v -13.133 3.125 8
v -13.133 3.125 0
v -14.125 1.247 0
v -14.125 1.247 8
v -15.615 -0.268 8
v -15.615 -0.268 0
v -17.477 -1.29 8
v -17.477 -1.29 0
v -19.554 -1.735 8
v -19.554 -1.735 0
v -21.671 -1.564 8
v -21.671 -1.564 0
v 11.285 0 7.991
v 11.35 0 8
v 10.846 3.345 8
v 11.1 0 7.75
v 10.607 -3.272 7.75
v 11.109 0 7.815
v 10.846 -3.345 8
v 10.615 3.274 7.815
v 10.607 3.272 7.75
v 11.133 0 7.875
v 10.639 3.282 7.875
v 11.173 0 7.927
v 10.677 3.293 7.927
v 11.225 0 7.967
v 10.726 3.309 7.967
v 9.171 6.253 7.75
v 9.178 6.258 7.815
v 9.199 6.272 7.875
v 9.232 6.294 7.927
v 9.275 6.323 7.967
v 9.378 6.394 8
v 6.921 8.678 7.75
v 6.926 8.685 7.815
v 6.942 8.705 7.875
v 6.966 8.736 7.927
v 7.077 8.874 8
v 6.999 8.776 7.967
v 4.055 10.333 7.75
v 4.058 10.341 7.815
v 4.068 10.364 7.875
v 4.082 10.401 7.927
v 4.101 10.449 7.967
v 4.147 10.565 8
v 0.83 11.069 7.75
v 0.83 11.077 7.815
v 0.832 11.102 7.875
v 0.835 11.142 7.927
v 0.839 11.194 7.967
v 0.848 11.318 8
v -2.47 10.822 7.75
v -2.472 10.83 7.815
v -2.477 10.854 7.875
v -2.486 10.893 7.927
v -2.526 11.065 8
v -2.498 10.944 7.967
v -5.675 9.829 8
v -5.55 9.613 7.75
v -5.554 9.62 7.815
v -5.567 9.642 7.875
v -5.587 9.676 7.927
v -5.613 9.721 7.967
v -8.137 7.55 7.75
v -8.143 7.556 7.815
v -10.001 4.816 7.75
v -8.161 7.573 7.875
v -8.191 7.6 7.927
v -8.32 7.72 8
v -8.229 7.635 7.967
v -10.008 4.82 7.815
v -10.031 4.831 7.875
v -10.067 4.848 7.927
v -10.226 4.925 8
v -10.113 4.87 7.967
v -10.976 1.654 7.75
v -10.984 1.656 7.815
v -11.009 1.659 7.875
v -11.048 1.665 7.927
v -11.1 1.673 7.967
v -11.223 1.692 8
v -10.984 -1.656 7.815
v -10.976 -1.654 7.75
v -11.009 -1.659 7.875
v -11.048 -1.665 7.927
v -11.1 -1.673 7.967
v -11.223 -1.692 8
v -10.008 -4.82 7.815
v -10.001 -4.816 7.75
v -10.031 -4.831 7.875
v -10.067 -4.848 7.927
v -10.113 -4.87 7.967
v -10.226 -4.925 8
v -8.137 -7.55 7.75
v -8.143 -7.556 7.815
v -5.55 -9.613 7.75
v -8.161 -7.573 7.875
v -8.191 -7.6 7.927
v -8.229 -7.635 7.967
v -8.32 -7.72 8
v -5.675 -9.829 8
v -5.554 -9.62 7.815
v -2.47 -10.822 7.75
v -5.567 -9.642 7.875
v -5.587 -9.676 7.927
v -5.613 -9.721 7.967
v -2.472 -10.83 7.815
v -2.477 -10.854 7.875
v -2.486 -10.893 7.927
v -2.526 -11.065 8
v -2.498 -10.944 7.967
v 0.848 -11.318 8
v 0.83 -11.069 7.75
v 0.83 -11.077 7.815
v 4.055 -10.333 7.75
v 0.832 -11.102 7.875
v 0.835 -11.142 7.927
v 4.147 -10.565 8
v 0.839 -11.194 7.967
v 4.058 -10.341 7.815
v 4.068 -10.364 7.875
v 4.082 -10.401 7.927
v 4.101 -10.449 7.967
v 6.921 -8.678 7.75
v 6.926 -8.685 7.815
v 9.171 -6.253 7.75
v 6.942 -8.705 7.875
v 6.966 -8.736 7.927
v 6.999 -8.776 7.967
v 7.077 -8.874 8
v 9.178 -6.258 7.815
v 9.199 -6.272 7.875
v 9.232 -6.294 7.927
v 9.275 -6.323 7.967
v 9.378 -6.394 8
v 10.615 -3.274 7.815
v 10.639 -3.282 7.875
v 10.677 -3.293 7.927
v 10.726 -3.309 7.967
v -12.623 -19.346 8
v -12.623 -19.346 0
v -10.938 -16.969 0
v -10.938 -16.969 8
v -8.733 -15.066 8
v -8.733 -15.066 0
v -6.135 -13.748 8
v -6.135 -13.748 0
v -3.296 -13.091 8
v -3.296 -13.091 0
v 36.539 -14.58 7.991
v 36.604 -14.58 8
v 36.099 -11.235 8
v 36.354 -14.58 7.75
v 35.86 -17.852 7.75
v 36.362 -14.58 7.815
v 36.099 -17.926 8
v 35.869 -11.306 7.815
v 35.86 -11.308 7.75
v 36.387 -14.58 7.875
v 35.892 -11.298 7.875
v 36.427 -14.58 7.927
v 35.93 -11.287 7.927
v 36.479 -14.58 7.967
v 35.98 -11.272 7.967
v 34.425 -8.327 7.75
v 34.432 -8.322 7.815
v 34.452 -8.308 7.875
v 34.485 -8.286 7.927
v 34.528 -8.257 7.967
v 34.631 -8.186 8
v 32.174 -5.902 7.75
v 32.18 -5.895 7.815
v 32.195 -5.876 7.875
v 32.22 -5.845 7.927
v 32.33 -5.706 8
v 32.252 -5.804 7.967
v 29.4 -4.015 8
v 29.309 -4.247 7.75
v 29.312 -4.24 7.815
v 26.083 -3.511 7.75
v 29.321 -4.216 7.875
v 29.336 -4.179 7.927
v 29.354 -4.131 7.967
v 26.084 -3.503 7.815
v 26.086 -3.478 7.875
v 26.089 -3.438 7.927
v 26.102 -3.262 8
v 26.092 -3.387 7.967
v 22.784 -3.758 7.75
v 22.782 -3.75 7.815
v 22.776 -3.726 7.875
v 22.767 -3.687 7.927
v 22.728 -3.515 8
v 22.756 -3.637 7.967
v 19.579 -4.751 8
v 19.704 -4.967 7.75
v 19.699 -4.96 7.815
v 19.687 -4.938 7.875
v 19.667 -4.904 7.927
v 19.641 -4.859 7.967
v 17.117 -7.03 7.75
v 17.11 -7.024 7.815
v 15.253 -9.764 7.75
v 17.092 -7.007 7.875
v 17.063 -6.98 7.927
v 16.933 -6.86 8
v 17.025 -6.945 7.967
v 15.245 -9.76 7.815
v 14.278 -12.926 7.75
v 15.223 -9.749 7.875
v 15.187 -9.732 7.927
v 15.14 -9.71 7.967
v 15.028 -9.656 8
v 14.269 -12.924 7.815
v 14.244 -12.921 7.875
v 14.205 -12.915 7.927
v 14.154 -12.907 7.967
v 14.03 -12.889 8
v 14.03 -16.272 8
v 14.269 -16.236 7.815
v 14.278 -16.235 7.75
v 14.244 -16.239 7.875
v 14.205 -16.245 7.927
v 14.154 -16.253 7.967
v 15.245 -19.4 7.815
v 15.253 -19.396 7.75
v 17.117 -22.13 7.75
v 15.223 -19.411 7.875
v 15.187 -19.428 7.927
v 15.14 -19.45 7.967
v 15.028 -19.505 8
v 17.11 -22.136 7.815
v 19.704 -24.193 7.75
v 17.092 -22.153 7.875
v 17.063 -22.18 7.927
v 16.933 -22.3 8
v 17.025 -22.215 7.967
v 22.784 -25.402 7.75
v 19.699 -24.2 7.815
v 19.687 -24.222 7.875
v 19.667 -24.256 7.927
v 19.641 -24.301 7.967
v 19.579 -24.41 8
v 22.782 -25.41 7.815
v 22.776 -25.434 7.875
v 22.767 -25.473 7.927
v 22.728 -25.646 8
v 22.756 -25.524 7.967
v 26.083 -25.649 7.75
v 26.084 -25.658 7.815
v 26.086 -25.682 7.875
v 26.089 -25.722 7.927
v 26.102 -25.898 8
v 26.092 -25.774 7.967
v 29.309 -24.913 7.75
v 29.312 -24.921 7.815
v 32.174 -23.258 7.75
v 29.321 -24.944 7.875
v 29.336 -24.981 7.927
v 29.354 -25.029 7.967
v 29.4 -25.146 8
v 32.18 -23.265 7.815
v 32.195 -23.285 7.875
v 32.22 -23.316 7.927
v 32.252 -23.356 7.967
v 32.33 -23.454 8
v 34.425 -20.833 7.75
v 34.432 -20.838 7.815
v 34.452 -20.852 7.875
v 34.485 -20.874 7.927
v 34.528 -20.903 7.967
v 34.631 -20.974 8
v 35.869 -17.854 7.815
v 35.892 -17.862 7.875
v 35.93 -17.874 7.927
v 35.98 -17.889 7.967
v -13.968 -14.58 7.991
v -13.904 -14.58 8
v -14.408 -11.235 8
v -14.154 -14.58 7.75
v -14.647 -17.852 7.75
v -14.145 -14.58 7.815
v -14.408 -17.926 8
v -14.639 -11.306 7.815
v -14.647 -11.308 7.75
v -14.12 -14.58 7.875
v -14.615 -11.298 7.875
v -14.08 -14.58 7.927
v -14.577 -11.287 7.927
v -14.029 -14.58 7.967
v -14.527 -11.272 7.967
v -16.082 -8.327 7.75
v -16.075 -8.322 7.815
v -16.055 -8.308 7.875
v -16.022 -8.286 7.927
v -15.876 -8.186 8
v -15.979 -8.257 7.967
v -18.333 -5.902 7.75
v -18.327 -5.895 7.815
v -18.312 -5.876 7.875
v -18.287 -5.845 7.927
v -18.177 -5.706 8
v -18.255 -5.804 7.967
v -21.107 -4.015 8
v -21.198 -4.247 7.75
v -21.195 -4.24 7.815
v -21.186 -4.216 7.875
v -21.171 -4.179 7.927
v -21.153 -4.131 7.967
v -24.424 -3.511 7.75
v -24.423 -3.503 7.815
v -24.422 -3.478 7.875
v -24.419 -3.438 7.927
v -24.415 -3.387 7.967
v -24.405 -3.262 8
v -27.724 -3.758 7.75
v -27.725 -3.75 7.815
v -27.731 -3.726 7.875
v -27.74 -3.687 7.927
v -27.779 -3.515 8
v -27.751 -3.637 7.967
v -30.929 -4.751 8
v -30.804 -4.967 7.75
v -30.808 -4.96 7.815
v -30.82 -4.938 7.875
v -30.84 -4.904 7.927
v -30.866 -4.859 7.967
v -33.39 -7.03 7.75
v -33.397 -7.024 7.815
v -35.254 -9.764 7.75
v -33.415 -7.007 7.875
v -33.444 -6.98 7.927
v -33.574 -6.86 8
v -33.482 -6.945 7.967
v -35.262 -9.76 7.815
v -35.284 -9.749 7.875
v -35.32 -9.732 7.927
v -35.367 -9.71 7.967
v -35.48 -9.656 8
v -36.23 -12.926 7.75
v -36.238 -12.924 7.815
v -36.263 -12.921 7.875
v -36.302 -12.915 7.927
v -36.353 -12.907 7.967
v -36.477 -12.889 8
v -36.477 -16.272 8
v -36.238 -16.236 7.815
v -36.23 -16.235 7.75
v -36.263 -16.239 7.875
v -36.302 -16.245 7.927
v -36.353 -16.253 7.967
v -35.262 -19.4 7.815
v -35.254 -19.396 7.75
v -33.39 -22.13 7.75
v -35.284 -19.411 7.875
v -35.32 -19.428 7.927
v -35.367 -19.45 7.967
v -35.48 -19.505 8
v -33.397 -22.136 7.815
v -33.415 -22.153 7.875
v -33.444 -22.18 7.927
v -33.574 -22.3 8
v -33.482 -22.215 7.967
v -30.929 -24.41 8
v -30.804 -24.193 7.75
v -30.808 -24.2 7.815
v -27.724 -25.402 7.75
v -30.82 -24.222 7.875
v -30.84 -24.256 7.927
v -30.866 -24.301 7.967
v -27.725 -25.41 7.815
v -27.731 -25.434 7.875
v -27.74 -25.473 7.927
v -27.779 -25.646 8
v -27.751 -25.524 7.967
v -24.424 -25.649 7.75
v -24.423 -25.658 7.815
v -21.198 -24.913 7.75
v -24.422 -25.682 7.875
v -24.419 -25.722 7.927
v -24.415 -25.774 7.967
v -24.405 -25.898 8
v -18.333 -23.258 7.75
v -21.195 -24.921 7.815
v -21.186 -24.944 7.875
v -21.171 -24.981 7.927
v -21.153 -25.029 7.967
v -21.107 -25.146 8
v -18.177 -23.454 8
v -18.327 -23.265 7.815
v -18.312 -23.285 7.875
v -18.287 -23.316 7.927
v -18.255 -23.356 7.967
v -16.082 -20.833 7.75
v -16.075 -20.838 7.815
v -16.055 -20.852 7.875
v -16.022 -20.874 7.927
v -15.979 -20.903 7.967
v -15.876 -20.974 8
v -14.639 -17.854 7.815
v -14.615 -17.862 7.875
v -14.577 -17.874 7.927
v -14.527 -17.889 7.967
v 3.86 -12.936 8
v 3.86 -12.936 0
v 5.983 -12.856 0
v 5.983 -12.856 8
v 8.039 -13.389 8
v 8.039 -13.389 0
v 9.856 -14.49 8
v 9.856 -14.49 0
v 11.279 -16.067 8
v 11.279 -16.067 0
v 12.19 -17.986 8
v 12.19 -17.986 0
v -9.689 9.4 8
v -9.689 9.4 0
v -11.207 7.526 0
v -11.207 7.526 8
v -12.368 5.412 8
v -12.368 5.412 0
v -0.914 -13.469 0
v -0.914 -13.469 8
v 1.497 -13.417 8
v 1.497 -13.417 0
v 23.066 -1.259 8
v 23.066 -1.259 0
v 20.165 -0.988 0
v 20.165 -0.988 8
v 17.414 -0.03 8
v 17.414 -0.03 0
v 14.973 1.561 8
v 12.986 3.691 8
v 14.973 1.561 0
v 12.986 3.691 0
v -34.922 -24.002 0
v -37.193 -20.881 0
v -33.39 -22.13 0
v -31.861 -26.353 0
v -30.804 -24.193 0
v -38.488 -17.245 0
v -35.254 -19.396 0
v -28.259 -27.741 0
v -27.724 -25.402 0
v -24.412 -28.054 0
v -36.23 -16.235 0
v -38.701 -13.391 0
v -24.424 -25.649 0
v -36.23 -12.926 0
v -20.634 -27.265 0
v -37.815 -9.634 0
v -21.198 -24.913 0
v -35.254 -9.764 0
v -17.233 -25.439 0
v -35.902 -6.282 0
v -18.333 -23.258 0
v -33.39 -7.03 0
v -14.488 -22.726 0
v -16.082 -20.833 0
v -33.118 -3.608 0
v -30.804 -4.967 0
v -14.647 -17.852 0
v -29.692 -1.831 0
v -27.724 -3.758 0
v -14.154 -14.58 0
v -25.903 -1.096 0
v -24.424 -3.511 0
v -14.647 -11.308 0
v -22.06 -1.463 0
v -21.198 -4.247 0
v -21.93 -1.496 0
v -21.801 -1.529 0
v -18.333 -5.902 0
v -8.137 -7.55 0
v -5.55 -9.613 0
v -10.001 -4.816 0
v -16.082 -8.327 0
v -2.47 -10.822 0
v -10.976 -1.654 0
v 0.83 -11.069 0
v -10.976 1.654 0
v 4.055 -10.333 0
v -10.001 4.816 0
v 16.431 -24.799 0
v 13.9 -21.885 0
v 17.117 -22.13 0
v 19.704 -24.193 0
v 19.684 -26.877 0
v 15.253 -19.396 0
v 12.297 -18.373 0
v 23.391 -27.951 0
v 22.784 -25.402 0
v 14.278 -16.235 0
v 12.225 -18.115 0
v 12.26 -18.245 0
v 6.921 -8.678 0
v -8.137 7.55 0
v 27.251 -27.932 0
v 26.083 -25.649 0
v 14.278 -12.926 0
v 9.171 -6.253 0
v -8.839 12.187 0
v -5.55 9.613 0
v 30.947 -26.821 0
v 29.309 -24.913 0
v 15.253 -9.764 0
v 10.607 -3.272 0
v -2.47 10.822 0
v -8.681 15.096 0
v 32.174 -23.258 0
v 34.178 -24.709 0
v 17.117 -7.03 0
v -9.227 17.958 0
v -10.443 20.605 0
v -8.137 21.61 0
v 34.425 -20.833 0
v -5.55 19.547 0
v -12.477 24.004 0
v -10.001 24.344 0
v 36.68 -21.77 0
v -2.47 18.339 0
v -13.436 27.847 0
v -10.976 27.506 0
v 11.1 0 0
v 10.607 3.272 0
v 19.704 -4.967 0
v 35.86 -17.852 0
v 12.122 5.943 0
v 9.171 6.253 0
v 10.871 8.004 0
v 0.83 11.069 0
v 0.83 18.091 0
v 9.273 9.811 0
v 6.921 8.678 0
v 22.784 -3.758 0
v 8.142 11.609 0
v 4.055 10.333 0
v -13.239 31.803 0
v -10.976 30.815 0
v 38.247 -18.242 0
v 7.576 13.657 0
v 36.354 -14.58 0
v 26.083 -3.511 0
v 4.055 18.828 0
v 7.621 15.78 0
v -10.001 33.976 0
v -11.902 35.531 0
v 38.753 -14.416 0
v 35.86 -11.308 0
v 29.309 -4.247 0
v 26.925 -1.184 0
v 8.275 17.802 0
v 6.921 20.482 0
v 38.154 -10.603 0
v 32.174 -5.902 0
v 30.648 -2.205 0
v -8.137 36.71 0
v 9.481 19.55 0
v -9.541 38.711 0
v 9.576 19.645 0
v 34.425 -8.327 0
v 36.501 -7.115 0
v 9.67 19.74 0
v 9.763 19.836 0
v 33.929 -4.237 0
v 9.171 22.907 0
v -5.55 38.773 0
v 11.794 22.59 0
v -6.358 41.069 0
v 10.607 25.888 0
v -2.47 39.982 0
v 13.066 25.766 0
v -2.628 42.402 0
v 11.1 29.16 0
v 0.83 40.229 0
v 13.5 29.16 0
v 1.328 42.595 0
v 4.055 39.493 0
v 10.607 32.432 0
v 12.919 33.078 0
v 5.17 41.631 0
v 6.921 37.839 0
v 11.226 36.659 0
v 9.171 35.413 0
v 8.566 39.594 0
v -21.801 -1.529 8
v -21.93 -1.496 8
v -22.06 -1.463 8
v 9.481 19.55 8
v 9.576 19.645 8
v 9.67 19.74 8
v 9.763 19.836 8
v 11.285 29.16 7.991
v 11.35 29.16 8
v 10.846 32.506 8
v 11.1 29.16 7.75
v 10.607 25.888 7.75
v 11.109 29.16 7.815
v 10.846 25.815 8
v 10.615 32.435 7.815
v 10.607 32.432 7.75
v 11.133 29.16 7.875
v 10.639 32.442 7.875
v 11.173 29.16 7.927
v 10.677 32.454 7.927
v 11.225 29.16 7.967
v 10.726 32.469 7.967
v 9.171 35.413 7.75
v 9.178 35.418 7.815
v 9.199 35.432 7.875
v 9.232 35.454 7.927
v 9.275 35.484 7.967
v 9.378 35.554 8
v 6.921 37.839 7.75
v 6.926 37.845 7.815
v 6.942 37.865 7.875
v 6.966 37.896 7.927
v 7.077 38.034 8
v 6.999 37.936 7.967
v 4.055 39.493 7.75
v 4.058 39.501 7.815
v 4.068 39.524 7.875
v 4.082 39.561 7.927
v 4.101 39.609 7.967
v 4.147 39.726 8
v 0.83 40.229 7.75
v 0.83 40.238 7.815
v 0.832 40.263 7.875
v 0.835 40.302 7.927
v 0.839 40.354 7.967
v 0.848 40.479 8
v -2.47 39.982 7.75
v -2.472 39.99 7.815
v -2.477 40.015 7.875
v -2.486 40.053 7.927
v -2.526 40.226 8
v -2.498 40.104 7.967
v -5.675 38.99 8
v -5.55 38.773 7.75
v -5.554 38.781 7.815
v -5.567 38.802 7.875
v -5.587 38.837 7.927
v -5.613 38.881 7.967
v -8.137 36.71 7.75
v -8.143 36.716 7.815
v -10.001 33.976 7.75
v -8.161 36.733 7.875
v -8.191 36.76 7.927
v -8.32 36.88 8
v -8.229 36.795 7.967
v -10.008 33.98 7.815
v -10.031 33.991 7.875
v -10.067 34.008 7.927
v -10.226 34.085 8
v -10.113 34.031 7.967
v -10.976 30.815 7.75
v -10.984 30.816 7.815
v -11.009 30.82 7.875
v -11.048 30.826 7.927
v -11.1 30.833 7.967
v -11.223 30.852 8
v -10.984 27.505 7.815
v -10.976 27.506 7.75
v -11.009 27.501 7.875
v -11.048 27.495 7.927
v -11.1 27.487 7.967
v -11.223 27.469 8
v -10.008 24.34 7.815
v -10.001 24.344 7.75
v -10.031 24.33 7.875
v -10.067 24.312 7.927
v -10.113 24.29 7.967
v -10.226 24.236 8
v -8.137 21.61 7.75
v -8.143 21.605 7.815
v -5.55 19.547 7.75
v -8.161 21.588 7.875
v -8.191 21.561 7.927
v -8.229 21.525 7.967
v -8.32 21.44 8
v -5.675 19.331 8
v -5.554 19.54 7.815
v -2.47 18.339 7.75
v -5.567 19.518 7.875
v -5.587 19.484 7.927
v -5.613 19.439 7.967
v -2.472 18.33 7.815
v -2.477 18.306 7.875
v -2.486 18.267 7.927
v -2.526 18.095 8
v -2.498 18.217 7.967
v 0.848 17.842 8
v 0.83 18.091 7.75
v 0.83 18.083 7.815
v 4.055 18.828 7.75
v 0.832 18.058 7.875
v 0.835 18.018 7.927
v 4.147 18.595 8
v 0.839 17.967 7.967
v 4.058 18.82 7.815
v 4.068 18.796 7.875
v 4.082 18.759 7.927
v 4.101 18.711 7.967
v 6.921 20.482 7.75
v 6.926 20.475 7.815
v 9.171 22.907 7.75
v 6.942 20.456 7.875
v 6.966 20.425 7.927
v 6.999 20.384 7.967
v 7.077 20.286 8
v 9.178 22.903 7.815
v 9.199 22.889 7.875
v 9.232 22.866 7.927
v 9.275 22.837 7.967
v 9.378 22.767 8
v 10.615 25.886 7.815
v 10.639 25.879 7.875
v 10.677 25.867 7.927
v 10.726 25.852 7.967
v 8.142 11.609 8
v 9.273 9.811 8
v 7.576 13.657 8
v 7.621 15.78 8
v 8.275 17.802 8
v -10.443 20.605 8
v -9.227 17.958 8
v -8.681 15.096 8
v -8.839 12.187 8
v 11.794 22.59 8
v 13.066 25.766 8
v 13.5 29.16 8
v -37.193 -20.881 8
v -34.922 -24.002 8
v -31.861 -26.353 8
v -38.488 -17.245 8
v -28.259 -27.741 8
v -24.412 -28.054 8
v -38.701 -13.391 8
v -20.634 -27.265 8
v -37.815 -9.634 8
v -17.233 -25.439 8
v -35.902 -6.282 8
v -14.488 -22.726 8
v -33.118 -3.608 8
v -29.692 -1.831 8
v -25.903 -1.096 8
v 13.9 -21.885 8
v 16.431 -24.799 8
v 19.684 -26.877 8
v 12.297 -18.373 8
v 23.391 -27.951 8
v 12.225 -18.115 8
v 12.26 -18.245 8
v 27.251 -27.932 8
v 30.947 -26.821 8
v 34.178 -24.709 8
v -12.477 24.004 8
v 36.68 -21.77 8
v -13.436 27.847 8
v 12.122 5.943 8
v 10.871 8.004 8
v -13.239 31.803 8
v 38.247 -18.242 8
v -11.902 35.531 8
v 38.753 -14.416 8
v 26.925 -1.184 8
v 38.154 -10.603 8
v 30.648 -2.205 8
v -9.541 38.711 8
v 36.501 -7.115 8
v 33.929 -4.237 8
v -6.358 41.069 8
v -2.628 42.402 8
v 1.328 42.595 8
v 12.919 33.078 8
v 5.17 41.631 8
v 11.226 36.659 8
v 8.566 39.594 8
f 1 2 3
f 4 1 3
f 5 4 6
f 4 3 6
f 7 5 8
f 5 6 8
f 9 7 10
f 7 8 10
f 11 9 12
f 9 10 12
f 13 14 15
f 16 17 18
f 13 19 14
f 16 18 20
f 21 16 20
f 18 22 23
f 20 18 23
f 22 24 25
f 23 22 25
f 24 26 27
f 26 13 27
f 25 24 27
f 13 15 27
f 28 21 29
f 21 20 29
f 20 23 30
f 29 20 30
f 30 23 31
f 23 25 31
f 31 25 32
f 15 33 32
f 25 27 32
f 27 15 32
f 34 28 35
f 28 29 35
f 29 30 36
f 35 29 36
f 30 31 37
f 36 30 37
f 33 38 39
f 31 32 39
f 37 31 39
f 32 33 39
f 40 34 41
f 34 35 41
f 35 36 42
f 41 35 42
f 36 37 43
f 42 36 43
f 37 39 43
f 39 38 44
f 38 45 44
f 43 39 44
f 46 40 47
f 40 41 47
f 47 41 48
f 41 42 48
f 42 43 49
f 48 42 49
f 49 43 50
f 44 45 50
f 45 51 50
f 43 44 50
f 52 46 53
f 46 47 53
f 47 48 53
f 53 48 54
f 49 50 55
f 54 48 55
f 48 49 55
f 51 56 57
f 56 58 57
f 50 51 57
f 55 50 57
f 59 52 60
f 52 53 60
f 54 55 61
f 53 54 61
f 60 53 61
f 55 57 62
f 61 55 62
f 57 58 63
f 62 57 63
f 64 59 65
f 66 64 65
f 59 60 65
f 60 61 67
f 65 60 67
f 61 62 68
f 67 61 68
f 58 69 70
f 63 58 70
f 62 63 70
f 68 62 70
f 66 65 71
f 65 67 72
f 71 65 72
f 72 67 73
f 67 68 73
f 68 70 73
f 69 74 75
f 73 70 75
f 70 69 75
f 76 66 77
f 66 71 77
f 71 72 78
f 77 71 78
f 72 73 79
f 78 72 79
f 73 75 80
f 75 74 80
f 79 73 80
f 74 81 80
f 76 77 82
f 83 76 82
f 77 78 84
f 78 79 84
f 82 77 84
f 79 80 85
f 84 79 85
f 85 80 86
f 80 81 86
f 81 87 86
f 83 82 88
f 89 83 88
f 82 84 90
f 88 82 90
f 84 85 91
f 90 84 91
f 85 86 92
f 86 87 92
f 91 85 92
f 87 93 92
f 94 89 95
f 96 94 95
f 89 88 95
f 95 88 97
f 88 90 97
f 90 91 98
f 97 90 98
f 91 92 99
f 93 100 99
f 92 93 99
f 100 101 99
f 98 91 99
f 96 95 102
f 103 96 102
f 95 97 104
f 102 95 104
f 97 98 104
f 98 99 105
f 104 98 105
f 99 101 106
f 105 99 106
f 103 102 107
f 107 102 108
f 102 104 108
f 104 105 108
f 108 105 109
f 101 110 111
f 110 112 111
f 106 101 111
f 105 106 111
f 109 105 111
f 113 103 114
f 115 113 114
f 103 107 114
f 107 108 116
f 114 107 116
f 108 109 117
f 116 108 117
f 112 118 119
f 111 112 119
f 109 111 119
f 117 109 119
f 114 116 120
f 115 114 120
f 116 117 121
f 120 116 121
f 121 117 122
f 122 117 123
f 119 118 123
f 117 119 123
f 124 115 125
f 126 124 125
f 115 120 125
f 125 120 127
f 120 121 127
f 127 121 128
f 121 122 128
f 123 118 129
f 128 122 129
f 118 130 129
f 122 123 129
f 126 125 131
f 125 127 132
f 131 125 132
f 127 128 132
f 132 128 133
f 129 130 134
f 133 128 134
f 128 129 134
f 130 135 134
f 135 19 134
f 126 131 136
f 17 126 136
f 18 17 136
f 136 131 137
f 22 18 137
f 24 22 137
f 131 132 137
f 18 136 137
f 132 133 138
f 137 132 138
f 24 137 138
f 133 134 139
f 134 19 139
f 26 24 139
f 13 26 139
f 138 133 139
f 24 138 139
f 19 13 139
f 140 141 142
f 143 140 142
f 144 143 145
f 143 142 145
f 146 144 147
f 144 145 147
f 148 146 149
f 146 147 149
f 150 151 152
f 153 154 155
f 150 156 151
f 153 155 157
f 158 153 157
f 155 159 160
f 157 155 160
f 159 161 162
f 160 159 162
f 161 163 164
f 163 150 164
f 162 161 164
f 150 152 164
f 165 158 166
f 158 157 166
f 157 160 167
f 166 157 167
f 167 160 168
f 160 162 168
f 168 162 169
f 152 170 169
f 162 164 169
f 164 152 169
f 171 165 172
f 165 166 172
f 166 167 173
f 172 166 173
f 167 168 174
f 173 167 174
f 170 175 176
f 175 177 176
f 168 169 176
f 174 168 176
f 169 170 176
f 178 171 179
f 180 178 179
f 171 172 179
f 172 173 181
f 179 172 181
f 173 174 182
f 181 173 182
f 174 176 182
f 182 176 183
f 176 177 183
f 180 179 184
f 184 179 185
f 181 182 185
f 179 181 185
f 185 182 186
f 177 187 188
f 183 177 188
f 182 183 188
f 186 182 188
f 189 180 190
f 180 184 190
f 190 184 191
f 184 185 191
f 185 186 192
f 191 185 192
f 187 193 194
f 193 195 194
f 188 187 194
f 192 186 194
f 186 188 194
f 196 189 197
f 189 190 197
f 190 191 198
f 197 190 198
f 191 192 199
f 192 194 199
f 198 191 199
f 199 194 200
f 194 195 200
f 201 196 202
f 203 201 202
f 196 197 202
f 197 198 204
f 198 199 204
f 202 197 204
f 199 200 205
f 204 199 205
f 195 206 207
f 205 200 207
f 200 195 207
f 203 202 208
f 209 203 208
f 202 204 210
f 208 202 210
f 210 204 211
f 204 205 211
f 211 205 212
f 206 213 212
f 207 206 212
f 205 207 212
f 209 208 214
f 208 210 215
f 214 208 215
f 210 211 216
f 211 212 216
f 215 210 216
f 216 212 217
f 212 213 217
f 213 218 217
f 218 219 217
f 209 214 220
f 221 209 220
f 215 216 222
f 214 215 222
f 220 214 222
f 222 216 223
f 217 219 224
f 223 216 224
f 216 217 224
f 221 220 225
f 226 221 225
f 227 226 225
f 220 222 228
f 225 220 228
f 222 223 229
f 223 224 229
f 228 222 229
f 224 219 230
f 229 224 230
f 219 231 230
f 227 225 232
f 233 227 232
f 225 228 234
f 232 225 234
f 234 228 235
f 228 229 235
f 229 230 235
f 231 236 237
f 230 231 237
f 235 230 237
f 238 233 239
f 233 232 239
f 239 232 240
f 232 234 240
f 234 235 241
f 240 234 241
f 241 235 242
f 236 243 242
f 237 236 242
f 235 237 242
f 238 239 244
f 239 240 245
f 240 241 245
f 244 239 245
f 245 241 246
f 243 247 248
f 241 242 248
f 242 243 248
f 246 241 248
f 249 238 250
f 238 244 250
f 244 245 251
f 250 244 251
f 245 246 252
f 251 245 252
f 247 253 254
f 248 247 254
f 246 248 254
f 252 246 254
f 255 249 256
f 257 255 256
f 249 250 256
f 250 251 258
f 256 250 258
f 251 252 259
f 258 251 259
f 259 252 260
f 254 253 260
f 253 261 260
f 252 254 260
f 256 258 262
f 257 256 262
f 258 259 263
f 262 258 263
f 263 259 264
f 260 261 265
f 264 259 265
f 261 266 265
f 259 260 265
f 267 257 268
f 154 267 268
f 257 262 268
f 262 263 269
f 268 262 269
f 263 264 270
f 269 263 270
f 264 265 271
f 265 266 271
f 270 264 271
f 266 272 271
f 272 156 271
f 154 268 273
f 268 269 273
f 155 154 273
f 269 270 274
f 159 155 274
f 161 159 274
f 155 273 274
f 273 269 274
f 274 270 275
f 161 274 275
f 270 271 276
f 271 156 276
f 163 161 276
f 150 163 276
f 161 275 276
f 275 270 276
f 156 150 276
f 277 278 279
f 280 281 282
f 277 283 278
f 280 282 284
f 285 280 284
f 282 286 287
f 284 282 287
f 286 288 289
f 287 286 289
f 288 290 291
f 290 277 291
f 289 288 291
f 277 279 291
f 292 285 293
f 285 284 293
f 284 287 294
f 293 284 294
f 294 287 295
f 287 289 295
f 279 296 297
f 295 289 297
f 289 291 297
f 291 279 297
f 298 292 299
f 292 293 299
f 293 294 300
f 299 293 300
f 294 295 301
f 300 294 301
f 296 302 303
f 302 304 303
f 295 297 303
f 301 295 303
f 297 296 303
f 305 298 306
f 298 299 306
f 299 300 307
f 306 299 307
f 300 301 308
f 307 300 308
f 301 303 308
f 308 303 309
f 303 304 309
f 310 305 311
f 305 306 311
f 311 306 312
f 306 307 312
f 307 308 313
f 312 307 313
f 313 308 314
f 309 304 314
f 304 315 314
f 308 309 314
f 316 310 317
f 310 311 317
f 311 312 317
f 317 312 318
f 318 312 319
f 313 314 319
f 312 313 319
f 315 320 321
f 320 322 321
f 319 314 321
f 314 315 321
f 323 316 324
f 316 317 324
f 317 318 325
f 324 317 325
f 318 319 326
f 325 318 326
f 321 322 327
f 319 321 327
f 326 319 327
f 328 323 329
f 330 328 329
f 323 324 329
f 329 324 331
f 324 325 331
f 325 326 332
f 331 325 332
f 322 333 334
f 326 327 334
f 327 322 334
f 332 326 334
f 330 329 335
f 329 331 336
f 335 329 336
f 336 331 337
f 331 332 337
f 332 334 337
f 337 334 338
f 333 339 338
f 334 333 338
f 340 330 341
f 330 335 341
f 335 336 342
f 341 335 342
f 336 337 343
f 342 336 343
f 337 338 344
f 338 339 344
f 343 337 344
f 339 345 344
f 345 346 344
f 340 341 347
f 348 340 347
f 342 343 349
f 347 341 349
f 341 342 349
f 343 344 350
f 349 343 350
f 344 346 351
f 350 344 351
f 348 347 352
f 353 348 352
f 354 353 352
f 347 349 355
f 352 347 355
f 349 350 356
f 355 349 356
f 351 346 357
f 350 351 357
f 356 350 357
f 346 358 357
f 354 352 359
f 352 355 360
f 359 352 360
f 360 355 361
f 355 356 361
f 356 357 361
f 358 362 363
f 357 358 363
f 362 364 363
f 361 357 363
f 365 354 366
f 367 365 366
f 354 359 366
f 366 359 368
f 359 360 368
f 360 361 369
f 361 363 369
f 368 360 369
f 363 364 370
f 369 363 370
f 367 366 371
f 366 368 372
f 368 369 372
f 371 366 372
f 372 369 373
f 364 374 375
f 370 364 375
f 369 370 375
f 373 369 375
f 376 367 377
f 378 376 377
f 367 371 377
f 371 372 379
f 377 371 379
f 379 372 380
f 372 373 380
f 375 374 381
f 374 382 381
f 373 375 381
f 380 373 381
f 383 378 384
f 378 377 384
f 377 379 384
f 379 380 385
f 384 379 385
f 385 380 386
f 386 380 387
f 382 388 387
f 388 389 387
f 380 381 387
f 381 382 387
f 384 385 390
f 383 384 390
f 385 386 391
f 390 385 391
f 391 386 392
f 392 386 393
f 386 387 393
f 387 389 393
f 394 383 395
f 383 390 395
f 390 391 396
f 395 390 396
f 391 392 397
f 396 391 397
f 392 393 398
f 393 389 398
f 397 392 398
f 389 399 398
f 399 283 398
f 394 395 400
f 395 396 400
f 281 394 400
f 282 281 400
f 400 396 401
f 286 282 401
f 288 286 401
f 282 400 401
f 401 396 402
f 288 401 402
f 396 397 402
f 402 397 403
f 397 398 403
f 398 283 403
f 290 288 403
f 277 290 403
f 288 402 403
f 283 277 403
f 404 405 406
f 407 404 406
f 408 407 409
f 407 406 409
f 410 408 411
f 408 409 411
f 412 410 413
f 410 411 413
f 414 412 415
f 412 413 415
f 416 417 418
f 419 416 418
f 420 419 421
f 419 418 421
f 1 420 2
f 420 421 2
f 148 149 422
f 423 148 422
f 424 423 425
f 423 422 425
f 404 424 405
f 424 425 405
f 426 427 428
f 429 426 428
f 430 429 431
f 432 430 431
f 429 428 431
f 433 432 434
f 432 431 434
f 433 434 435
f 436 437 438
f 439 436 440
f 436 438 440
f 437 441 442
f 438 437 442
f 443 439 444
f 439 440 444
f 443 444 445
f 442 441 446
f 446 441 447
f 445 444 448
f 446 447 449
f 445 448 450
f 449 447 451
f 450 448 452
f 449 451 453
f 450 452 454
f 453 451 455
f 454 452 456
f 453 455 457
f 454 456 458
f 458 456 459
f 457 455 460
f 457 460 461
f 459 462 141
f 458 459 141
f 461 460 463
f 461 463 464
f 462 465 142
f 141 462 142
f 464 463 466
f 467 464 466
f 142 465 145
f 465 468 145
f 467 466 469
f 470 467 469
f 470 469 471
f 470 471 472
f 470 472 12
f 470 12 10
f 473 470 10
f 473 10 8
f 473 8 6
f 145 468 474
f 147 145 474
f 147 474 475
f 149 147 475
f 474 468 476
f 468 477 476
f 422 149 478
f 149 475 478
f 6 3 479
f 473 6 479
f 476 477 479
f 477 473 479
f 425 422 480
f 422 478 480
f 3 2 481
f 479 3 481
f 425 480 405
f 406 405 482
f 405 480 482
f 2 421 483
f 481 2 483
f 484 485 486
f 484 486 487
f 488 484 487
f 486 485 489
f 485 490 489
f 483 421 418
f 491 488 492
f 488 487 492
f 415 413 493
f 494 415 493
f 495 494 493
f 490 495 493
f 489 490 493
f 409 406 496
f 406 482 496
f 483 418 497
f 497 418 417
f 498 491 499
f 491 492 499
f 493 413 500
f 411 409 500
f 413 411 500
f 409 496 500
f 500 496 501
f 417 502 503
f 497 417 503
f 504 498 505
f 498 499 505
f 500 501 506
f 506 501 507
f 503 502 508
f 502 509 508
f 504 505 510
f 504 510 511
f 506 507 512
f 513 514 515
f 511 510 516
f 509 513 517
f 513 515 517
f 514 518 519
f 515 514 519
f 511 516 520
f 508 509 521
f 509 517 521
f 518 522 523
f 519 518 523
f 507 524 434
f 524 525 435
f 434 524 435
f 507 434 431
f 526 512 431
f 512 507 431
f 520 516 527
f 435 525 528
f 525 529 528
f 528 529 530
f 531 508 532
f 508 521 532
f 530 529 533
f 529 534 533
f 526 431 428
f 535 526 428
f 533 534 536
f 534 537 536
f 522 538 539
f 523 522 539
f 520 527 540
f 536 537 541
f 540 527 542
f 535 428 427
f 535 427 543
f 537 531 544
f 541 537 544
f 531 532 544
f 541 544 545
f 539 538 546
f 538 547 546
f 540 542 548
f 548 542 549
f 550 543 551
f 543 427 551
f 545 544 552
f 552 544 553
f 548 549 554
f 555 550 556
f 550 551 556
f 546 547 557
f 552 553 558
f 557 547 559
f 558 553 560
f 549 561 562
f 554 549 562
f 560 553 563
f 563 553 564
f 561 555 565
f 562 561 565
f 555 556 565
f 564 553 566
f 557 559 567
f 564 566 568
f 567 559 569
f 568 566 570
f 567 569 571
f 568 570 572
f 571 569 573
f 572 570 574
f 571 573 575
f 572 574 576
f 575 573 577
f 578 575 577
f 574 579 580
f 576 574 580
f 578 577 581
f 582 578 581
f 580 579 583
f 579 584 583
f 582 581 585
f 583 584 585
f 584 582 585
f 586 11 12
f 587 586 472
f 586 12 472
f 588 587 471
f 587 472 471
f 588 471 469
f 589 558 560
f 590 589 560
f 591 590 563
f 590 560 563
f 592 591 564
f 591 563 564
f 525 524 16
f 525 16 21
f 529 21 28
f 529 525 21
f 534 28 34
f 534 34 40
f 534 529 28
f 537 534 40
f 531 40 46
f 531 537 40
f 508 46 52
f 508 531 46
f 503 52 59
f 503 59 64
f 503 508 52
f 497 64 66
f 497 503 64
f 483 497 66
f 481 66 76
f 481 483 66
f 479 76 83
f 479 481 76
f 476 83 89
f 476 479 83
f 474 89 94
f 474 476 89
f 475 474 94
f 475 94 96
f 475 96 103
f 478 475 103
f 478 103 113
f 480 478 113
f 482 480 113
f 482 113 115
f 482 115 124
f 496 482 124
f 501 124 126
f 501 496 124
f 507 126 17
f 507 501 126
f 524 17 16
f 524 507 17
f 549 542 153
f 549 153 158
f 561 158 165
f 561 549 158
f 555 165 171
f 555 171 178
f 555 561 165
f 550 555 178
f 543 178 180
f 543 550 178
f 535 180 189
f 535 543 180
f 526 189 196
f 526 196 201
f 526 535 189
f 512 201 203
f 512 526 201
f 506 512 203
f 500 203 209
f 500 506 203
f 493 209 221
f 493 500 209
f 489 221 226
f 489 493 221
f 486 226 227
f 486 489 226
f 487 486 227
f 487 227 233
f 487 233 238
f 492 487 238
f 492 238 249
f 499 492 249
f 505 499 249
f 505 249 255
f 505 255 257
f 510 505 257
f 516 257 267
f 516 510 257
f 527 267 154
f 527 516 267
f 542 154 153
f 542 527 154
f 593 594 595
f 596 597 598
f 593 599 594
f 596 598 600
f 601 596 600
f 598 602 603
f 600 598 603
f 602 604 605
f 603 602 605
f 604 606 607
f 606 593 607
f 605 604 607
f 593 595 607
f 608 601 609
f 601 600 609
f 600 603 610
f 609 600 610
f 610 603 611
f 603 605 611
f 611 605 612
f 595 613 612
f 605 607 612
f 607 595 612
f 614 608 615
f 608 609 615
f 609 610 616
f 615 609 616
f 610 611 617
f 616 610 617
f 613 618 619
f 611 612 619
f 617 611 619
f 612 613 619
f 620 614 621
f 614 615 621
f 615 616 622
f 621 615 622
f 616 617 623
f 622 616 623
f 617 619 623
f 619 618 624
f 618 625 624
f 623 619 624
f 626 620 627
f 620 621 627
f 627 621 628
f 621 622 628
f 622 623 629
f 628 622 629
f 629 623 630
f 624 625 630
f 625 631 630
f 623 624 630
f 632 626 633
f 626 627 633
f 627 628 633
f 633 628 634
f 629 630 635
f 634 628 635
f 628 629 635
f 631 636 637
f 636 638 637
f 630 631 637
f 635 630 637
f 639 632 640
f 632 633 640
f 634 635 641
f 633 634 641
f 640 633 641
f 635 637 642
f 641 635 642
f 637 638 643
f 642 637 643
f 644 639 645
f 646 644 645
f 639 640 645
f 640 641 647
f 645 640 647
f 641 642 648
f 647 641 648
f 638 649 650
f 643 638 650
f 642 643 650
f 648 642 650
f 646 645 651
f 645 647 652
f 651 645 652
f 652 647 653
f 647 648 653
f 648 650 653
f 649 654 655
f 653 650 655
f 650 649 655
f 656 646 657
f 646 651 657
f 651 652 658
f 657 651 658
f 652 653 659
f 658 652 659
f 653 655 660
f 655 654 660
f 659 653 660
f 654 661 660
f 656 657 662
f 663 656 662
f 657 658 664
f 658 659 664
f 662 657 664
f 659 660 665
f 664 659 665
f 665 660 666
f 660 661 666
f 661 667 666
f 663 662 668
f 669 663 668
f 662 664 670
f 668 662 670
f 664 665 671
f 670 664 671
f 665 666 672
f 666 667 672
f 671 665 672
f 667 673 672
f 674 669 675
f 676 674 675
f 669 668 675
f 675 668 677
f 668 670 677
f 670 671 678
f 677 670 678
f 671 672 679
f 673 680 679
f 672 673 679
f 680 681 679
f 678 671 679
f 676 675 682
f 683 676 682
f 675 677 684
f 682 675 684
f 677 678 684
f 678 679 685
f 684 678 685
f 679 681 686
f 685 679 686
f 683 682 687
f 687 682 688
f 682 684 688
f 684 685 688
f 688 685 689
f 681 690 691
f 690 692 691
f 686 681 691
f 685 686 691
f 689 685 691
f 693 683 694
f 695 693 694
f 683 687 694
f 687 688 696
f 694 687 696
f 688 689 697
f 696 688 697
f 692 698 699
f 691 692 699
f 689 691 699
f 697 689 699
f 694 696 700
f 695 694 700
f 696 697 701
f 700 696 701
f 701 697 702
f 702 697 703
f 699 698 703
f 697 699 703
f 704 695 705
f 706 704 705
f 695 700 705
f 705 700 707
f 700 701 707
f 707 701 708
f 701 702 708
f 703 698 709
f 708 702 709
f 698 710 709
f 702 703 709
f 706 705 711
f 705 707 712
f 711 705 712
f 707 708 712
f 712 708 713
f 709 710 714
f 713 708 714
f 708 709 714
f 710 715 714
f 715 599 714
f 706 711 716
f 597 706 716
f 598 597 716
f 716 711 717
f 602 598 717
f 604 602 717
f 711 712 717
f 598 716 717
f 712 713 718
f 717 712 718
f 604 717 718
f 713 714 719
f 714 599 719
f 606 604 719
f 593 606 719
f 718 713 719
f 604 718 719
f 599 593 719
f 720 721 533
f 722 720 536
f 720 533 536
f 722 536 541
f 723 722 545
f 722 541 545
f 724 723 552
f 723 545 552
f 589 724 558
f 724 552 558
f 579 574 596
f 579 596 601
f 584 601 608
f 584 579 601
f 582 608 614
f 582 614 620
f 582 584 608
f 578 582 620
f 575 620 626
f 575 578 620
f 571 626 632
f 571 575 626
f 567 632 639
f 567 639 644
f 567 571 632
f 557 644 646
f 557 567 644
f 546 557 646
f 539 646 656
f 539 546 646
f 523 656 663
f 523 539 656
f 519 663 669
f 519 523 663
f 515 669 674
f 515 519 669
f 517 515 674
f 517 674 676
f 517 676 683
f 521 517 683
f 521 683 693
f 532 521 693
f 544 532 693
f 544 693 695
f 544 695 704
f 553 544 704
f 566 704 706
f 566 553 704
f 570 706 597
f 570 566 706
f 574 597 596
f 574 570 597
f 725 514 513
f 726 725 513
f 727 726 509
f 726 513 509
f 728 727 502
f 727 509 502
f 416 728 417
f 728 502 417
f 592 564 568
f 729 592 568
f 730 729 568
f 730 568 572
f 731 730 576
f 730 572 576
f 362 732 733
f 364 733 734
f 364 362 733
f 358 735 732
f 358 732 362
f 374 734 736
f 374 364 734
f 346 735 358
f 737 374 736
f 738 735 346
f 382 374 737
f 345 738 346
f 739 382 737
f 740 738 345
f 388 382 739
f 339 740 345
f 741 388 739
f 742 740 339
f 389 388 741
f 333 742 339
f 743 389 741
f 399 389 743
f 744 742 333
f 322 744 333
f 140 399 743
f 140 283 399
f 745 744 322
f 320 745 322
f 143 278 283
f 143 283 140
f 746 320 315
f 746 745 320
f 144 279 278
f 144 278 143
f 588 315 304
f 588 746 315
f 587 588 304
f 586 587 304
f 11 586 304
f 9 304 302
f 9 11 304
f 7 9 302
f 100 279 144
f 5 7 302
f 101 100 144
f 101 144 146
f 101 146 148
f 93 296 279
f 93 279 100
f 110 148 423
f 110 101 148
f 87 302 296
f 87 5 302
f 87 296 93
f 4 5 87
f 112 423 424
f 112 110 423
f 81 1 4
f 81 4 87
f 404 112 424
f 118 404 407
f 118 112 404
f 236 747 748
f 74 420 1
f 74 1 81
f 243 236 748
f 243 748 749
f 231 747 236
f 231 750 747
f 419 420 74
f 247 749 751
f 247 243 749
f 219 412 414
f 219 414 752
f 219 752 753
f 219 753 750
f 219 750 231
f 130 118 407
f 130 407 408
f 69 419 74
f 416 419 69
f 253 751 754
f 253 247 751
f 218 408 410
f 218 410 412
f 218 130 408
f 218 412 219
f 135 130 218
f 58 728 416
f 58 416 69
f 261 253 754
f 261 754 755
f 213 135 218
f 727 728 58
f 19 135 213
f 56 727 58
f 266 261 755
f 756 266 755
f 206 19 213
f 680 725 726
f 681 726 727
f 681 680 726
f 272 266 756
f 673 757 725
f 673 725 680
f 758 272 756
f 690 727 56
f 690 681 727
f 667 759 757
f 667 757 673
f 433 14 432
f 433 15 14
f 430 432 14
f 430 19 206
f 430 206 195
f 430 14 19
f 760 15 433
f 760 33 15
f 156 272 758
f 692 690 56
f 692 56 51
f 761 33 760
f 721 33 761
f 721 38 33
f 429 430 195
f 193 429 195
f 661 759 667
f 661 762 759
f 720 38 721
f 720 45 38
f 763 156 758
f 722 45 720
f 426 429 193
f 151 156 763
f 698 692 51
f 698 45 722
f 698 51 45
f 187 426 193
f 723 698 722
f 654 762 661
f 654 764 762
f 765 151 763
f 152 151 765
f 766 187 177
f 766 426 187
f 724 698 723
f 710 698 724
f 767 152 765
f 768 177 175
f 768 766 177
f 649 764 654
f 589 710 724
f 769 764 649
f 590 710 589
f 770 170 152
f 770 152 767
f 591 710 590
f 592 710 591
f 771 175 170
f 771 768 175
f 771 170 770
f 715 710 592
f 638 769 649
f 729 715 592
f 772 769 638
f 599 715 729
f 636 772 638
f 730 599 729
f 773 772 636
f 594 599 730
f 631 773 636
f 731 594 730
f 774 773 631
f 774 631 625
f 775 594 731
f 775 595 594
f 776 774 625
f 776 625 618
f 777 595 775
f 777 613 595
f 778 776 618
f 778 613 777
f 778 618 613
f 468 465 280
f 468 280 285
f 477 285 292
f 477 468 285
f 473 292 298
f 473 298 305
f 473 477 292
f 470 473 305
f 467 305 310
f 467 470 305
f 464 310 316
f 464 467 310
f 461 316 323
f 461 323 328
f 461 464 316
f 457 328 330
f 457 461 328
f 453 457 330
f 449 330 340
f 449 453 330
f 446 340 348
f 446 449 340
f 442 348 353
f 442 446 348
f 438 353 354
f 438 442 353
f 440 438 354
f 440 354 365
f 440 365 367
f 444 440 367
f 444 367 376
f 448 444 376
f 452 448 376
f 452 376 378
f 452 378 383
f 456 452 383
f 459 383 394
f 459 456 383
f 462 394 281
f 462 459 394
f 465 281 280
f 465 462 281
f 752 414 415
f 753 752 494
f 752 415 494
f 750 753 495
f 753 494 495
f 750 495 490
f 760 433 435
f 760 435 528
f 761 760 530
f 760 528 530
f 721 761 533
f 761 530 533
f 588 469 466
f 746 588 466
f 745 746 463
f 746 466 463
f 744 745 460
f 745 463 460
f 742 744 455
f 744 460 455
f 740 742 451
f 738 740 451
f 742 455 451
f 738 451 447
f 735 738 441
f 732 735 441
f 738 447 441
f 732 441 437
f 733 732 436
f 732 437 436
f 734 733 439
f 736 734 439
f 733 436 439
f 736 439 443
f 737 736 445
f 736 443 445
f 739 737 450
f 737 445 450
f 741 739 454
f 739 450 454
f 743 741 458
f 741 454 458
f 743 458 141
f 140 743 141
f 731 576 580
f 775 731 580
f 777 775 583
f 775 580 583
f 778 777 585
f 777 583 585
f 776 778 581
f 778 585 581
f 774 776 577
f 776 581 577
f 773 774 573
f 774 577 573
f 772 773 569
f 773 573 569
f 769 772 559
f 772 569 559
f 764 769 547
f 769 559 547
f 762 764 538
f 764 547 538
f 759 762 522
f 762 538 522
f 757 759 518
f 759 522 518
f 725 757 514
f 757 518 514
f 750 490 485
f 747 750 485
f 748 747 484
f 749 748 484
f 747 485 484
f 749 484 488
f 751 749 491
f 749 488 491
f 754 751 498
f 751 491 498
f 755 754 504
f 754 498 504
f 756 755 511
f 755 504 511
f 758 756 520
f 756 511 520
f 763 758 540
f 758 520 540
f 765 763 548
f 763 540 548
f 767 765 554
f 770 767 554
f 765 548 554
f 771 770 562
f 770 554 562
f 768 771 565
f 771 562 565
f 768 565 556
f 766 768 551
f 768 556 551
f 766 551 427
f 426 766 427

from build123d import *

# Parameters (mm, degrees)
F0_R     = 11.1
F1_DEPTH = 8
F2_R     = 0.25


# Not quite as in the source:
# - a feature of the source that left no trace in its solid (it failed there, or was rolled back) is left out


with BuildPart() as f1:
    # F0 (on Top) → F1 (new body)
    with BuildSketch(Plane.XY):
        with BuildLine():
            ThreePointArc((3.859865491, -12.9364383967), (10.8249291944, -8.0666540731), (13.5, 0))
            ThreePointArc((13.5, 0), (13.3707834369, 1.8633706782), (12.9856073653, 3.691070489))
            ThreePointArc((12.9856073653, 3.691070489), (11.5424684167, 7.0015300363), (9.2733515405, 9.8109607688))
            ThreePointArc((9.2733515405, 9.8109607688), (-0.2922686684, 13.4968358894), (-9.6893644933, 9.4003306174))
            ThreePointArc((-9.6893644933, 9.4003306174), (-11.8347370851, 6.4953058532), (-13.1332170315, 3.1254776279))
            ThreePointArc((-13.1332170315, 3.1254776279), (-11.5424684167, -7.0015300363), (-3.296242872, -13.0914011064))
            ThreePointArc((-3.296242872, -13.0914011064), (0.2922686684, -13.4968358894), (3.859865491, -12.9364383967))
        make_face()
        Circle(F0_R, mode=Mode.SUBTRACT)
        with BuildLine():
            ThreePointArc((12.9856073653, 3.691070489), (13.3707834369, 1.8633706782), (13.5, 0))
            ThreePointArc((13.5, 0), (10.8249291944, -8.0666540731), (3.859865491, -12.9364383967))
            ThreePointArc((3.859865491, -12.9364383967), (8.9875948966, -13.8732661585), (12.1902212779, -17.985982946))
            ThreePointArc((12.1902212779, -17.985982946), (13.9354582524, -7.2213929241), (23.0659975588, -1.2585494405))
            ThreePointArc((23.0659975588, -1.2585494405), (17.4140534965, -0.0296267076), (12.9856073653, 3.691070489))
        make_face()
        with BuildLine():
            ThreePointArc((-9.6893644933, 9.4003306174), (-0.2922686684, 13.4968358894), (9.2733515405, 9.8109607688))
            ThreePointArc((9.2733515405, 9.8109607688), (7.5208034785, 14.7201185786), (9.4812075043, 19.5500327774))
            ThreePointArc((9.4812075043, 19.5500327774), (-0.7138194032, 15.679157322), (-10.443062992, 20.6050145698))
            ThreePointArc((-10.443062992, 20.6050145698), (-8.6813692668, 15.0958260647), (-9.6893644933, 9.4003306174))
        make_face()
        with BuildLine():
            ThreePointArc((38.7535366191, -14.580136165), (33.9919066812, -4.2898063036), (23.0659975588, -1.2585494405))
            ThreePointArc((23.0659975588, -1.2585494405), (13.9354582524, -7.2213929241), (12.1902212779, -17.985982946))
            ThreePointArc((12.1902212779, -17.985982946), (12.2464624781, -18.1789066882), (12.297383992, -18.3733022703))
            ThreePointArc((12.297383992, -18.3733022703), (27.1695141155, -27.9434826858), (38.7535366191, -14.580136165))
        make_face()
        with Locations((25.2535366191, -14.580136165)):
            Circle(F0_R, mode=Mode.SUBTRACT)
        with BuildLine():
            ThreePointArc((-12.6229345668, -19.3464651293), (-8.7326842297, -15.066199357), (-3.296242872, -13.0914011064))
            ThreePointArc((-3.296242872, -13.0914011064), (-11.5424684167, -7.0015300363), (-13.1332170315, 3.1254776279))
            ThreePointArc((-13.1332170315, 3.1254776279), (-16.508398375, -0.8468524201), (-21.6714287822, -1.5640498314))
            ThreePointArc((-21.6714287822, -1.5640498314), (-14.5155559943, -6.3980965598), (-11.7535366191, -14.580136165))
            ThreePointArc((-11.7535366191, -14.580136165), (-11.9726645147, -17.0026216958), (-12.6229345668, -19.3464651293))
        make_face()
        with BuildLine():
            ThreePointArc((12.297383992, -18.3733022703), (12.2464624781, -18.1789066882), (12.1902212779, -17.985982946))
            ThreePointArc((12.1902212779, -17.985982946), (12.24236133, -18.1800413854), (12.297383992, -18.3733022703))
        make_face()
        with BuildLine():
            ThreePointArc((9.7630545215, 19.8364980723), (9.620163766, 19.6952009566), (9.4812075043, 19.5500327774))
            ThreePointArc((9.4812075043, 19.5500327774), (9.6231970167, 19.6922166068), (9.7630545215, 19.8364980723))
        make_face()
        with BuildLine():
            ThreePointArc((-10.443062992, 20.6050145698), (-0.7138194032, 15.679157322), (9.4812075043, 19.5500327774))
            ThreePointArc((9.4812075043, 19.5500327774), (9.620163766, 19.6952009566), (9.7630545215, 19.8364980723))
            ThreePointArc((9.7630545215, 19.8364980723), (12.5309863148, 24.1378842547), (13.5, 29.16027233))
            ThreePointArc((13.5, 29.16027233), (-4.5425020422, 41.8730877223), (-10.443062992, 20.6050145698))
        make_face()
        with Locations((0, 29.16027233)):
            Circle(F0_R, mode=Mode.SUBTRACT)
        with BuildLine():
            ThreePointArc((-22.0604385135, -1.463195802), (-37.1929755561, -20.8809137257), (-12.6229345668, -19.3464651293))
            ThreePointArc((-12.6229345668, -19.3464651293), (-11.9726645147, -17.0026216958), (-11.7535366191, -14.580136165))
            ThreePointArc((-11.7535366191, -14.580136165), (-14.5155559943, -6.3980965598), (-21.6714287822, -1.5640498314))
            ThreePointArc((-21.6714287822, -1.5640498314), (-21.8666262441, -1.5162942684), (-22.0604385135, -1.463195802))
        make_face()
        with Locations((-25.2535366191, -14.580136165)):
            Circle(F0_R, mode=Mode.SUBTRACT)
        with BuildLine():
            ThreePointArc((-22.0604385135, -1.463195802), (-21.8666262441, -1.5162942684), (-21.6714287822, -1.5640498314))
            ThreePointArc((-21.6714287822, -1.5640498314), (-21.8655583466, -1.5121752213), (-22.0604385135, -1.463195802))
        make_face()
    extrude(amount=F1_DEPTH)

    # F2
    f2_edges = [f1.edges().sort_by_distance(p)[0] for p in [
        (-11.1, 29.160272, 8),
        (-36.353537, -14.580136, 8),
        (14.153537, -14.580136, 8),
        (-11.1, 0, 8),
    ]]
    fillet(f2_edges, radius=F2_R)


solid = f1.part
